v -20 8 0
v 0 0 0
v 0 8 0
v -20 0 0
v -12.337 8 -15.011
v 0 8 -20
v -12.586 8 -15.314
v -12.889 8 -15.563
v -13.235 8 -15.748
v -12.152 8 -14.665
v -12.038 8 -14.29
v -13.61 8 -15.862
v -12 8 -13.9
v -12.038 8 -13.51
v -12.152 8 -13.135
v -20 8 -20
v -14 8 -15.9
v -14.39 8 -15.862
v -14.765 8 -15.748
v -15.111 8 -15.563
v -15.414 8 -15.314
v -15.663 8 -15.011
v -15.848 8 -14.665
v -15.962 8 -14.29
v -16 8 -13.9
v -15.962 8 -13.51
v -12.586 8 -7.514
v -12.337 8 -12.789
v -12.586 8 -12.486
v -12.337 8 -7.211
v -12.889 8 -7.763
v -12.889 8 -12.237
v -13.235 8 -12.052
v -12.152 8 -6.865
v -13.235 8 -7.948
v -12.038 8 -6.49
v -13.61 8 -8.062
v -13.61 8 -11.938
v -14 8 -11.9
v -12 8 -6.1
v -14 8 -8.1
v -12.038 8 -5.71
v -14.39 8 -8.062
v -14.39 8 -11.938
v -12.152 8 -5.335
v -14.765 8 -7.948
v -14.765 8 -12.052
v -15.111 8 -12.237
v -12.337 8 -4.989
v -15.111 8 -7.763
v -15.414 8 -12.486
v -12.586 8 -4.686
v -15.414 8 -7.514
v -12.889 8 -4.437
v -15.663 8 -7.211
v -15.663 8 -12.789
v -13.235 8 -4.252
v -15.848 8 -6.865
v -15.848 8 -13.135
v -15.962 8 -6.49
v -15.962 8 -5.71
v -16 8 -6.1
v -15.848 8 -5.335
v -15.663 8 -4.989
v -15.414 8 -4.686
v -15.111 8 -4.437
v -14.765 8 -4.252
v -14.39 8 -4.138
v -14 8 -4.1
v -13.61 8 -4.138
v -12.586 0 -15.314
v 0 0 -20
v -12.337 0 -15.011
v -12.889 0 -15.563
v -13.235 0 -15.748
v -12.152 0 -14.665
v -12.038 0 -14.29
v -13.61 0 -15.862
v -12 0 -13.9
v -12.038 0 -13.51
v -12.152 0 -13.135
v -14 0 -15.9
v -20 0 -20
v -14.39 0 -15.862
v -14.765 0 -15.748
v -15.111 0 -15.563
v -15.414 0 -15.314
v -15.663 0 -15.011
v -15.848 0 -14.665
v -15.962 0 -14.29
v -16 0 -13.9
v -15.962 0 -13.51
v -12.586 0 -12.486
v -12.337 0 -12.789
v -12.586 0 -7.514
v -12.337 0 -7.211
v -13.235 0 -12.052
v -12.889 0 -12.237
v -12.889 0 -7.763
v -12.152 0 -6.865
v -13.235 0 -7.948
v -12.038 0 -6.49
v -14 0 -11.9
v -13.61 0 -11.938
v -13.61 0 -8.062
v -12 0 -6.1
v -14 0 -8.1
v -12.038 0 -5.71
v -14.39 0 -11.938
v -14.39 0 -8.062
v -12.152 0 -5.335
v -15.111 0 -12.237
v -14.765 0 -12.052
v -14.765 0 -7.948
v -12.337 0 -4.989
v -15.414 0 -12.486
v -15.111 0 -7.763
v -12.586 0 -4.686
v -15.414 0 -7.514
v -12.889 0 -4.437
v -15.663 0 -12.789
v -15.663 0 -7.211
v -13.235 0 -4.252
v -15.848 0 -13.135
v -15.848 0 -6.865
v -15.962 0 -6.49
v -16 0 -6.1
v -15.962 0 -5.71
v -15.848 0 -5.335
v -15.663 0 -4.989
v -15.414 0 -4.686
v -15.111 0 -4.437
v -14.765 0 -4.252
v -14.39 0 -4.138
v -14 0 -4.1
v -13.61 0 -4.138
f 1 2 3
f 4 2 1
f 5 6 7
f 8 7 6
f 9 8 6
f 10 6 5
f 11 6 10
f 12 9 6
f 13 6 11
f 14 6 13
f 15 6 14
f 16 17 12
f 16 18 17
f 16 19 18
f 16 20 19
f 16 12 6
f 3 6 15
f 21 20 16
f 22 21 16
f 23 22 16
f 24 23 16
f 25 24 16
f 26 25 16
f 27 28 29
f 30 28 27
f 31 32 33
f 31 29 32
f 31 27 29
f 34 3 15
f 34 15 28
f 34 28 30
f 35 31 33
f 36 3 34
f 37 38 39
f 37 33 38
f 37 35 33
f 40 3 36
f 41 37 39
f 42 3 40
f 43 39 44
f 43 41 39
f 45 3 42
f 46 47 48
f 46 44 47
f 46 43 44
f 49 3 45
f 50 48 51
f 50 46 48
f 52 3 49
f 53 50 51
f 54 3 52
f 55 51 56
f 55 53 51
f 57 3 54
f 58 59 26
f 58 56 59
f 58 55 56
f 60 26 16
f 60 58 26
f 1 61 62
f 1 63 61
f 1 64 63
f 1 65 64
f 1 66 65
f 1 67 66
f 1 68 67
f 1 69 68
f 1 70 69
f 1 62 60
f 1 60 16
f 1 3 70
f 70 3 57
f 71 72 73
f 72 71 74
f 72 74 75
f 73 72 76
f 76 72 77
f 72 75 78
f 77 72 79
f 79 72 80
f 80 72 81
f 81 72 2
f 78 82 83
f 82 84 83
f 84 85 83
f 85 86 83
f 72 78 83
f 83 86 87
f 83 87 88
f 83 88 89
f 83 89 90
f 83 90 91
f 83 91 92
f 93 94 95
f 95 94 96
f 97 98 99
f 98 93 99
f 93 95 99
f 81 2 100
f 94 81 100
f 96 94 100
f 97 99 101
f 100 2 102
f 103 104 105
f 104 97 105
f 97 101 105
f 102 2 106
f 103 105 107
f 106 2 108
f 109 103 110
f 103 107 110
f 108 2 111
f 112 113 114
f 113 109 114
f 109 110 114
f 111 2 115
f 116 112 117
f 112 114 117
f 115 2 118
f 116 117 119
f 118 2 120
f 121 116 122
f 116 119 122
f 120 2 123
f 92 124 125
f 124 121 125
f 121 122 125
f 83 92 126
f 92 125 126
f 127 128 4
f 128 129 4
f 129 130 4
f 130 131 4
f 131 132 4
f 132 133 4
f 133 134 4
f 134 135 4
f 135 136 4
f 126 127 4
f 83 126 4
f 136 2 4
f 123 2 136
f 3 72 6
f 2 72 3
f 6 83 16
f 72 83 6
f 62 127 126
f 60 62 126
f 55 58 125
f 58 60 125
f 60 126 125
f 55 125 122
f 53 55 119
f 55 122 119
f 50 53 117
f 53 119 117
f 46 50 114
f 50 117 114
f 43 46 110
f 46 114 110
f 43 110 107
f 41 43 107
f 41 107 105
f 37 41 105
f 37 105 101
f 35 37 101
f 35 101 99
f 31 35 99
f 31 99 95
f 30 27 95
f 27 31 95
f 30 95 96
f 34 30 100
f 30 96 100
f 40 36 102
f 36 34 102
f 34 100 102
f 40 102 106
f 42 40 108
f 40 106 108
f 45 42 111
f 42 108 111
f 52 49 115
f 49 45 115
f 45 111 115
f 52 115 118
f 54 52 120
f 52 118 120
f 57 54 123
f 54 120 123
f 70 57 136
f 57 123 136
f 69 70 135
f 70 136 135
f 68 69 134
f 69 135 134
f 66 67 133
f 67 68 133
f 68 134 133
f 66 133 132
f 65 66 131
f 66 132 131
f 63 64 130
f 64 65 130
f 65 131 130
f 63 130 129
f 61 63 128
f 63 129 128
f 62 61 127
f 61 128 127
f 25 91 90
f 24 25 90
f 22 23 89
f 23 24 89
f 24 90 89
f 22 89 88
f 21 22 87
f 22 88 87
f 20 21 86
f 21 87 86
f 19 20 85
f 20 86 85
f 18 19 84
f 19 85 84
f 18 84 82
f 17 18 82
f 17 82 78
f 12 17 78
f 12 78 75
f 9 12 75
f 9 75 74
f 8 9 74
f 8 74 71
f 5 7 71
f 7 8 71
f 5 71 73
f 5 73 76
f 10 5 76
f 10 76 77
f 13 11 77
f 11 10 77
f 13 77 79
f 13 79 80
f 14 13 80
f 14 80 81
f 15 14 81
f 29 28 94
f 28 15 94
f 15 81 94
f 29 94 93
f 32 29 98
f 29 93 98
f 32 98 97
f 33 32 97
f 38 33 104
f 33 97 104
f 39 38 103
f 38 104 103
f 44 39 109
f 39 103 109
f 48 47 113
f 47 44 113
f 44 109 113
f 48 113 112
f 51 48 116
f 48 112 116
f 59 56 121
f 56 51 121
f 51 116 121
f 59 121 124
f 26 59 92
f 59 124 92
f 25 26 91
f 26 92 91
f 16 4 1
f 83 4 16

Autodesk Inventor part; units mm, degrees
ref_plane "YZ Plane" through (0, 0, 0) normal (1, 0, 0) x (0, 1, 0)
ref_plane "XZ Plane" through (0, 0, 0) normal (0, 1, 0) x (-1, 0, 0)
ref_plane "XY Plane" through (0, 0, 0) normal (0, 0, 1) x (1, 0, 0)
sketch "Sketch1" plane through (0, 0, 0) normal (0, 1, 0) x (-1, 0, 0)
  line L0 (0, 0) -> (20, 0)
  line L1 (20, 0) -> (20, -20)
  line L2 (20, -20) -> (0, -20)
  line L3 (0, -20) -> (0, 0)
  circle A0 centre (14, -6.1) radius 2
  circle A1 centre (14, -13.9) radius 2
  dimension "d0" = 20
  dimension "d1" = 20
  dimension "d2" = 4
  dimension "d3" = 4
  dimension "d4" = 7.8
  dimension "d5" = 6.1
  dimension "d6" = 6
  dimension "d7" = 6
extrude "Extrusion1" add sketch "Sketch1" along normal blind 8
properties part number "motor spacer"
